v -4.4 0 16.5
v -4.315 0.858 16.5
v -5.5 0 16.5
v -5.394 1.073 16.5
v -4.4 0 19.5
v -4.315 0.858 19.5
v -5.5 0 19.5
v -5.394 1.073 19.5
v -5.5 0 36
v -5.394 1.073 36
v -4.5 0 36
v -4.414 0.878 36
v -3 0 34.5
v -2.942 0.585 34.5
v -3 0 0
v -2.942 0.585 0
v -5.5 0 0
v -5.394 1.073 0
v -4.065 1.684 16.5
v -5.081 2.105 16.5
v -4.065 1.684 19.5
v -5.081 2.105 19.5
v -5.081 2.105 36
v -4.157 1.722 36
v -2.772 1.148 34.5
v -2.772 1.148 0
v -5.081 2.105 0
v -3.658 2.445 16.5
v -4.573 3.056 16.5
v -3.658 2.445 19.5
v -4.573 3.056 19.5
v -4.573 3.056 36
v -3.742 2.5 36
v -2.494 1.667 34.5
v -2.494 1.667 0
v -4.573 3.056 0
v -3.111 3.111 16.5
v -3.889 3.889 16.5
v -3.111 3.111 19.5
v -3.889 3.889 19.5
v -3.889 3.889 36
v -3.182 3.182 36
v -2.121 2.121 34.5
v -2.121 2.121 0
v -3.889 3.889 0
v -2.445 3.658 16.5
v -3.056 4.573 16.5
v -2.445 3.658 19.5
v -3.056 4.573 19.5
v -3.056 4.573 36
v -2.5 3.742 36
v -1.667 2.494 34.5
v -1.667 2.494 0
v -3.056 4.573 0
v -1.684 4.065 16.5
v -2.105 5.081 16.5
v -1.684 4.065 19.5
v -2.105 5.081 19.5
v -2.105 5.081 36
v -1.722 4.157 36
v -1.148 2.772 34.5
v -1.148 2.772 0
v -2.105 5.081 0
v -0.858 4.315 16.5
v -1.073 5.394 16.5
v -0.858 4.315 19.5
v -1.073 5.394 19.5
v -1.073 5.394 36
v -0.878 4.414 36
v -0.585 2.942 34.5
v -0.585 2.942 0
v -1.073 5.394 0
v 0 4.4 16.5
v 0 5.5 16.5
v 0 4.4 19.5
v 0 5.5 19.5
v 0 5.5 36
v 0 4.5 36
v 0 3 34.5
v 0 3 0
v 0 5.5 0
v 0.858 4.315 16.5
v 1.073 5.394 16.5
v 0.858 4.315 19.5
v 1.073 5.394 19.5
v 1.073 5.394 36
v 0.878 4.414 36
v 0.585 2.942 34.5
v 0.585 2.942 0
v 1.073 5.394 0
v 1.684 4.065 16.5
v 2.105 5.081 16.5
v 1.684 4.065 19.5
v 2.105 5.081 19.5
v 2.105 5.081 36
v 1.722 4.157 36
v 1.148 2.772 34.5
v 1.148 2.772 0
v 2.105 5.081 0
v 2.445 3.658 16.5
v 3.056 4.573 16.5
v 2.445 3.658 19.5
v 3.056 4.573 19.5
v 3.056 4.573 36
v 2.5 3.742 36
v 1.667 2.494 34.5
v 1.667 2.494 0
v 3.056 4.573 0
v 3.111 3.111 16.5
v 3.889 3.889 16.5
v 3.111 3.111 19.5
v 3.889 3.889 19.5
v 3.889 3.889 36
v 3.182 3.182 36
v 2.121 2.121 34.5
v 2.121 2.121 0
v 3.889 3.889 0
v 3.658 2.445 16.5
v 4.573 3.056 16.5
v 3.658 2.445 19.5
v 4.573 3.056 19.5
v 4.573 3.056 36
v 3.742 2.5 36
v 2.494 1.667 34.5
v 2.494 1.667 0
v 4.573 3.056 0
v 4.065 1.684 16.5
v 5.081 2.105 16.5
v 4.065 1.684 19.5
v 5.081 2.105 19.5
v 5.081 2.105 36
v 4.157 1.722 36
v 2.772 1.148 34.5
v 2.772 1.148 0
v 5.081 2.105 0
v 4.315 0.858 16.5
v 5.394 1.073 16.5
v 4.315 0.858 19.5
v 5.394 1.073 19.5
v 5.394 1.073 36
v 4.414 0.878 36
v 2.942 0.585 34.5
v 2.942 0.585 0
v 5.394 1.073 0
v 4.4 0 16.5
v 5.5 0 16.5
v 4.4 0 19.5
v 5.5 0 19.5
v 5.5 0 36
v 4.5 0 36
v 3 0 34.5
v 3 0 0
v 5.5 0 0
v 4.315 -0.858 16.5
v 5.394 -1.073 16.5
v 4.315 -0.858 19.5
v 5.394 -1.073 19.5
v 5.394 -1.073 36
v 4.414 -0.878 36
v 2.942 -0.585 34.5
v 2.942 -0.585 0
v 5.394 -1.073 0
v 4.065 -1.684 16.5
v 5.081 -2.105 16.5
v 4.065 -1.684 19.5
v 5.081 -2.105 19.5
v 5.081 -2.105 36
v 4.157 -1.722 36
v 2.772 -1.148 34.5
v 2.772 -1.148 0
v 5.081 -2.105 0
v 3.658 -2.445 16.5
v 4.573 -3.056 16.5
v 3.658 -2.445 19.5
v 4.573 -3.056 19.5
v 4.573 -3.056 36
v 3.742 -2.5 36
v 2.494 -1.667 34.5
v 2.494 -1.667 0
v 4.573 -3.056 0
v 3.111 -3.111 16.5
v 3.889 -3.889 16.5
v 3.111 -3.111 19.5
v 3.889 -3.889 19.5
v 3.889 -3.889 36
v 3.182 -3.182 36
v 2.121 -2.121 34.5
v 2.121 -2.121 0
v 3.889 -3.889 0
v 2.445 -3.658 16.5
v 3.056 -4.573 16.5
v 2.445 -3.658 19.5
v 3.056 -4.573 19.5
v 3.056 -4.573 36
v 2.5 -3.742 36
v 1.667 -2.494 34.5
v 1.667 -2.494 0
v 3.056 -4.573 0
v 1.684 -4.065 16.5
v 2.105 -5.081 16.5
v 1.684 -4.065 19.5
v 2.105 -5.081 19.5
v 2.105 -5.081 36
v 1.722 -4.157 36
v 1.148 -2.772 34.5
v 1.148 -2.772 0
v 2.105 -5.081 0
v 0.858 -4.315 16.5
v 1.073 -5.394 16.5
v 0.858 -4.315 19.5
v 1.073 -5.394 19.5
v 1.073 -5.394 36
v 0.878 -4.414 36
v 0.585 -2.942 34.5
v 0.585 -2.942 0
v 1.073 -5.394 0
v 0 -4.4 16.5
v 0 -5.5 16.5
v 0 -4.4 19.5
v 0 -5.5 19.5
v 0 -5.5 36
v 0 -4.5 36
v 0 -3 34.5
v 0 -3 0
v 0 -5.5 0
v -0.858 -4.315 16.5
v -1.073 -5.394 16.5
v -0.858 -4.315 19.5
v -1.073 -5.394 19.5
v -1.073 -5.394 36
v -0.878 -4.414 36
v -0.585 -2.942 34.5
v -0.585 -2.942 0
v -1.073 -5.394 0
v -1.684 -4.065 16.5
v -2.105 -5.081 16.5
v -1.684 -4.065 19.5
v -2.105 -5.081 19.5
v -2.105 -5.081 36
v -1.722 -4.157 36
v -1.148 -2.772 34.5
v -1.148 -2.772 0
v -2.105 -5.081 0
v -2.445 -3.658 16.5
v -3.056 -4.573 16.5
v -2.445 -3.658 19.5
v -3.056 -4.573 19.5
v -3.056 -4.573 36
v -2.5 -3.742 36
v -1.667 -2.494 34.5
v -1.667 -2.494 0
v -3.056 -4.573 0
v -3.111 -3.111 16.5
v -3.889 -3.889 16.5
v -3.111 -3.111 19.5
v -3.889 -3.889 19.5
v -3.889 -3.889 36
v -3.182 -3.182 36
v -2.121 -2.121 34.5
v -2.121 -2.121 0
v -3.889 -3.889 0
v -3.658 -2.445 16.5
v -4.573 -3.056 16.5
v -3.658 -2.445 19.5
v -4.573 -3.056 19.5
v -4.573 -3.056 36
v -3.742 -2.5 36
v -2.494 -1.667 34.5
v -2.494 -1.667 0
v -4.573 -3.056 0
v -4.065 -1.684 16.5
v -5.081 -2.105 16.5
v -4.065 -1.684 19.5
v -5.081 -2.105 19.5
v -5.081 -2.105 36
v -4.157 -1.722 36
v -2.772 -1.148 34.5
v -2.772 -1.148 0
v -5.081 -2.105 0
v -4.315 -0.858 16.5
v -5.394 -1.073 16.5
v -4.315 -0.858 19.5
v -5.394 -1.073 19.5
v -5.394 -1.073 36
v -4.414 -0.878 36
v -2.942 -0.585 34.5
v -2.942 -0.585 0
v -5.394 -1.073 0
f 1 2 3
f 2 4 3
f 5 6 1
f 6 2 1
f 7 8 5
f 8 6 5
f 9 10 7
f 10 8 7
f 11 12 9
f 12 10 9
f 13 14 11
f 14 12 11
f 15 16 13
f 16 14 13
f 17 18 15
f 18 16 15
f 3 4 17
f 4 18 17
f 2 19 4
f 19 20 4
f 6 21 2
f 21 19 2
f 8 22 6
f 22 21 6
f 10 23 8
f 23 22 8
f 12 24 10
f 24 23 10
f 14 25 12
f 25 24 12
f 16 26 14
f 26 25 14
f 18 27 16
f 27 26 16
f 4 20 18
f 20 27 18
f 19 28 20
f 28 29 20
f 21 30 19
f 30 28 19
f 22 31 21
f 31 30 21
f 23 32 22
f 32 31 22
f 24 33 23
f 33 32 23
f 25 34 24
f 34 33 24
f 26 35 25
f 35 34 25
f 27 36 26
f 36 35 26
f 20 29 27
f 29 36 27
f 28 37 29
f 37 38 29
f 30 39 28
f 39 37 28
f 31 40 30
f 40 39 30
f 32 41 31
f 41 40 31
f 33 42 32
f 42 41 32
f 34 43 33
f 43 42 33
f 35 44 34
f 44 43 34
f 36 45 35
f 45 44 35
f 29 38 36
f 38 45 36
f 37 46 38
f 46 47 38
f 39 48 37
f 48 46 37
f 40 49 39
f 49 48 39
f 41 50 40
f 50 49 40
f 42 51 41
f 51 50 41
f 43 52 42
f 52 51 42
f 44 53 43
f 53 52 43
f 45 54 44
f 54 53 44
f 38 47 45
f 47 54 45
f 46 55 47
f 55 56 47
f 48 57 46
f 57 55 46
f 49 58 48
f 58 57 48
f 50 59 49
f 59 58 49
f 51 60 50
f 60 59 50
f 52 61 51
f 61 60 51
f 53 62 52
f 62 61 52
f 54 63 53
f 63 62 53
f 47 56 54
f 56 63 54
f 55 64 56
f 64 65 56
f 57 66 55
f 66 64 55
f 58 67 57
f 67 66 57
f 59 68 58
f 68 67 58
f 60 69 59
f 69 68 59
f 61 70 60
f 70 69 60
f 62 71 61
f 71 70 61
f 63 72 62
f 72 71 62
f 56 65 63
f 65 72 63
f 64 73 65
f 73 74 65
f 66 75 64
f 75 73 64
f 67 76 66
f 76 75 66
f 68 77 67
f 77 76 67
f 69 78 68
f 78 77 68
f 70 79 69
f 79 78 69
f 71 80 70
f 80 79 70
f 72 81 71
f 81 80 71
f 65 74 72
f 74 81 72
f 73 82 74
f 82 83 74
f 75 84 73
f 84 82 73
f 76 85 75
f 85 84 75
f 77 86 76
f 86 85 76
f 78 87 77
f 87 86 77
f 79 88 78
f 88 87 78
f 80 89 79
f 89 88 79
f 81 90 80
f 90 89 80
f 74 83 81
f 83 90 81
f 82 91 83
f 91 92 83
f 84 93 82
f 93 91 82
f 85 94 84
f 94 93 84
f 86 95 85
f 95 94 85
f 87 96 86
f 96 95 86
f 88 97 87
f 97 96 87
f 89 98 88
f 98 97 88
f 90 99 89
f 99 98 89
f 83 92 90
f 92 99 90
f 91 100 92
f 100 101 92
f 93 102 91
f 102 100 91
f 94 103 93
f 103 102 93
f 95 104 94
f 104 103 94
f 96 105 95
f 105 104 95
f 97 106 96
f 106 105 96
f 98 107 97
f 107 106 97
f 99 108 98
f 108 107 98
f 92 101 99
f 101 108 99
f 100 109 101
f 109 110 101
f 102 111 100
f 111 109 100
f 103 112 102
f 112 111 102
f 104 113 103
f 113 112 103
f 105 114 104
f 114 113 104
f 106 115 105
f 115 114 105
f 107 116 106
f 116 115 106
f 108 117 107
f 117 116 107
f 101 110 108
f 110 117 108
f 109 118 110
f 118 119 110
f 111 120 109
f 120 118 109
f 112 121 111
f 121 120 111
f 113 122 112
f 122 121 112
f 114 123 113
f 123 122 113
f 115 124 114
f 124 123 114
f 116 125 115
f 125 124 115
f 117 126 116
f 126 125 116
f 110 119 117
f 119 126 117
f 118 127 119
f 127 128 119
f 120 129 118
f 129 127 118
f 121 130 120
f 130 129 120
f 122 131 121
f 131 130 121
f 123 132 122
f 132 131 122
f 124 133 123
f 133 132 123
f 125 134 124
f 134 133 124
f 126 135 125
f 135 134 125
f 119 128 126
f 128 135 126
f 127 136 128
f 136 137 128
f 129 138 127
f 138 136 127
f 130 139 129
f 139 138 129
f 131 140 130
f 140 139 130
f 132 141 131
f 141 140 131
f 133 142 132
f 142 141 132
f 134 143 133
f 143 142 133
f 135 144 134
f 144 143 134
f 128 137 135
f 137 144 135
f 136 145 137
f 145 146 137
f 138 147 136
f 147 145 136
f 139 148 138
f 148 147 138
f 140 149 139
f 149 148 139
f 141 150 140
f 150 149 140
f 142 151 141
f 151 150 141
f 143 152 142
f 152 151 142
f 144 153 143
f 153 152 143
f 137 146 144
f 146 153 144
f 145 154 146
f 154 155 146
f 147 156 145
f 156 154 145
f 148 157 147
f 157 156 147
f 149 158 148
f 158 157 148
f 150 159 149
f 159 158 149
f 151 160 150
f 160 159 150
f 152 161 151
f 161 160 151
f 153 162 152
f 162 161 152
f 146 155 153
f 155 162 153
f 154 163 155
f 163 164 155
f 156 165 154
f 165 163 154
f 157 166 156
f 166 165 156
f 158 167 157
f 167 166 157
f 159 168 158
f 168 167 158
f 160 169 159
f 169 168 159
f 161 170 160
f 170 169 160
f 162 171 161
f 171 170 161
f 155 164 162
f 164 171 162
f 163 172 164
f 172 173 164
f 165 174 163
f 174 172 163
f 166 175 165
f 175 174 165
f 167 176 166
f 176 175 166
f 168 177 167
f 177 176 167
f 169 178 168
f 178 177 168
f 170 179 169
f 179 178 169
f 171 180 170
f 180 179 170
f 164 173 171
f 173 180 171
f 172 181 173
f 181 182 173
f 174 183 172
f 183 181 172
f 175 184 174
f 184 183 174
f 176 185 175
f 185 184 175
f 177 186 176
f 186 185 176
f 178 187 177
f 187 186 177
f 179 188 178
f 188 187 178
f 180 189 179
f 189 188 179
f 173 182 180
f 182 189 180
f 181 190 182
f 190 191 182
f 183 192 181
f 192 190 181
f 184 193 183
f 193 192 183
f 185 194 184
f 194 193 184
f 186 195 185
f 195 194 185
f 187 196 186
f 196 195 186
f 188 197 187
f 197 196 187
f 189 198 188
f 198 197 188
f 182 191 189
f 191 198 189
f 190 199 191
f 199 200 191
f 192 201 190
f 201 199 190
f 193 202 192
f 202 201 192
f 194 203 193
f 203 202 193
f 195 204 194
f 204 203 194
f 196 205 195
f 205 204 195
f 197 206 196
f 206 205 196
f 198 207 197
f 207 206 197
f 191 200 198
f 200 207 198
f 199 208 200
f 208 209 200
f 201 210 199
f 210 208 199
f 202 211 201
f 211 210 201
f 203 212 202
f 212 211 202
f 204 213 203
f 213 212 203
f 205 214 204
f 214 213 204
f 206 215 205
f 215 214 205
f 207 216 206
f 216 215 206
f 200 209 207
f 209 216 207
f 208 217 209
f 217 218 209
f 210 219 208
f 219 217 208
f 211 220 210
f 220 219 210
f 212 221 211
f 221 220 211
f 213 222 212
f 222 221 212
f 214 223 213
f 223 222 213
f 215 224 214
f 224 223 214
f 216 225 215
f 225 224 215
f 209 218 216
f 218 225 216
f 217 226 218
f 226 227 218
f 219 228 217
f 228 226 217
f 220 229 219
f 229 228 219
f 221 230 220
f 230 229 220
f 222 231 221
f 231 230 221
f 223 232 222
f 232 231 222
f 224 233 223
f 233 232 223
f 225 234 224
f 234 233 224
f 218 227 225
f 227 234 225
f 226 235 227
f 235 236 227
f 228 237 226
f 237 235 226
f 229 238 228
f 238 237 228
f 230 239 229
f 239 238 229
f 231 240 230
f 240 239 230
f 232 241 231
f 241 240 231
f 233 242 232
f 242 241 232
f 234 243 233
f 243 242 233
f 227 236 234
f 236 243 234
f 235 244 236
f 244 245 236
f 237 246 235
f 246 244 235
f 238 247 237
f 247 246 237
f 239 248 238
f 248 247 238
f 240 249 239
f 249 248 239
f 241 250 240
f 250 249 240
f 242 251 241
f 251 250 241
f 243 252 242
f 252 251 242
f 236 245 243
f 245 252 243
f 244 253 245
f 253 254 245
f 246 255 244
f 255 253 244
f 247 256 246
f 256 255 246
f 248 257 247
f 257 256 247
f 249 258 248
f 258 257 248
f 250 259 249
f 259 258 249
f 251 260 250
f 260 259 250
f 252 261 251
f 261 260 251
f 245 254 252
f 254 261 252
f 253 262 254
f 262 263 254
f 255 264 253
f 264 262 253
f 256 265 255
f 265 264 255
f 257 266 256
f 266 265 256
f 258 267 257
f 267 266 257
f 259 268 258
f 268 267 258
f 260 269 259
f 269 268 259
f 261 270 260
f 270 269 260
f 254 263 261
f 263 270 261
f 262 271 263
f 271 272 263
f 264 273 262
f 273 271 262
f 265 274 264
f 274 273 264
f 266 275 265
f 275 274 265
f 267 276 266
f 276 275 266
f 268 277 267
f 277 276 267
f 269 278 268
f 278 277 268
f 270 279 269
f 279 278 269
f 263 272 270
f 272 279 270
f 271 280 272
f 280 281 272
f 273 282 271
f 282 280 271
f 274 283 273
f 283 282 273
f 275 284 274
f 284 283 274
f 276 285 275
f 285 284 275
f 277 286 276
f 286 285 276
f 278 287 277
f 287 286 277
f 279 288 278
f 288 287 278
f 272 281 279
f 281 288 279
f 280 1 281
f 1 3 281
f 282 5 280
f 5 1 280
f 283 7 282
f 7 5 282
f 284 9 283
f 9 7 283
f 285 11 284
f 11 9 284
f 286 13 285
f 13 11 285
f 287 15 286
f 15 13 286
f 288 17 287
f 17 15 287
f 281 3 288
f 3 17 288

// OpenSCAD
$fn = 32;

// ----------------------------------------------------------------------
// Grooved revolve: thread_relief, bore R3
// ----------------------------------------------------------------------

// --- parameters (mm) ---
bore_r = 3;               // bore radius
outer_r = 5.5;            // outer radius of the body
total_h = 36;             // overall height, Z
wall = 2.5;               // radial wall thickness
groove_w = 3;             // groove width
groove_d = 1.1;           // groove depth
grooves = 1;              // number of outer grooves
relief = 1.5;             // thread relief leg at the bore mouth
relief_angle = 45;        // thread relief chamfer angle, degrees

bbox_x = 2 * outer_r;  // full diameter
bore_d = 2 * bore_r;  // bore diameter
body_d = 2 * outer_r;  // body diameter
revolve_angle = 360;  // full turn around the Z axis

profile = [[3, 0], [5.5, 0], [5.5, 16.5], [4.4, 16.5], [4.4, 19.5], [5.5, 19.5], [5.5, 36], [4.5, 36], [3, 34.5]];  // primary outline, 9 points, counter clockwise

// --- the one profile operation ---
rotate_extrude(angle = revolve_angle) polygon(points = profile);
